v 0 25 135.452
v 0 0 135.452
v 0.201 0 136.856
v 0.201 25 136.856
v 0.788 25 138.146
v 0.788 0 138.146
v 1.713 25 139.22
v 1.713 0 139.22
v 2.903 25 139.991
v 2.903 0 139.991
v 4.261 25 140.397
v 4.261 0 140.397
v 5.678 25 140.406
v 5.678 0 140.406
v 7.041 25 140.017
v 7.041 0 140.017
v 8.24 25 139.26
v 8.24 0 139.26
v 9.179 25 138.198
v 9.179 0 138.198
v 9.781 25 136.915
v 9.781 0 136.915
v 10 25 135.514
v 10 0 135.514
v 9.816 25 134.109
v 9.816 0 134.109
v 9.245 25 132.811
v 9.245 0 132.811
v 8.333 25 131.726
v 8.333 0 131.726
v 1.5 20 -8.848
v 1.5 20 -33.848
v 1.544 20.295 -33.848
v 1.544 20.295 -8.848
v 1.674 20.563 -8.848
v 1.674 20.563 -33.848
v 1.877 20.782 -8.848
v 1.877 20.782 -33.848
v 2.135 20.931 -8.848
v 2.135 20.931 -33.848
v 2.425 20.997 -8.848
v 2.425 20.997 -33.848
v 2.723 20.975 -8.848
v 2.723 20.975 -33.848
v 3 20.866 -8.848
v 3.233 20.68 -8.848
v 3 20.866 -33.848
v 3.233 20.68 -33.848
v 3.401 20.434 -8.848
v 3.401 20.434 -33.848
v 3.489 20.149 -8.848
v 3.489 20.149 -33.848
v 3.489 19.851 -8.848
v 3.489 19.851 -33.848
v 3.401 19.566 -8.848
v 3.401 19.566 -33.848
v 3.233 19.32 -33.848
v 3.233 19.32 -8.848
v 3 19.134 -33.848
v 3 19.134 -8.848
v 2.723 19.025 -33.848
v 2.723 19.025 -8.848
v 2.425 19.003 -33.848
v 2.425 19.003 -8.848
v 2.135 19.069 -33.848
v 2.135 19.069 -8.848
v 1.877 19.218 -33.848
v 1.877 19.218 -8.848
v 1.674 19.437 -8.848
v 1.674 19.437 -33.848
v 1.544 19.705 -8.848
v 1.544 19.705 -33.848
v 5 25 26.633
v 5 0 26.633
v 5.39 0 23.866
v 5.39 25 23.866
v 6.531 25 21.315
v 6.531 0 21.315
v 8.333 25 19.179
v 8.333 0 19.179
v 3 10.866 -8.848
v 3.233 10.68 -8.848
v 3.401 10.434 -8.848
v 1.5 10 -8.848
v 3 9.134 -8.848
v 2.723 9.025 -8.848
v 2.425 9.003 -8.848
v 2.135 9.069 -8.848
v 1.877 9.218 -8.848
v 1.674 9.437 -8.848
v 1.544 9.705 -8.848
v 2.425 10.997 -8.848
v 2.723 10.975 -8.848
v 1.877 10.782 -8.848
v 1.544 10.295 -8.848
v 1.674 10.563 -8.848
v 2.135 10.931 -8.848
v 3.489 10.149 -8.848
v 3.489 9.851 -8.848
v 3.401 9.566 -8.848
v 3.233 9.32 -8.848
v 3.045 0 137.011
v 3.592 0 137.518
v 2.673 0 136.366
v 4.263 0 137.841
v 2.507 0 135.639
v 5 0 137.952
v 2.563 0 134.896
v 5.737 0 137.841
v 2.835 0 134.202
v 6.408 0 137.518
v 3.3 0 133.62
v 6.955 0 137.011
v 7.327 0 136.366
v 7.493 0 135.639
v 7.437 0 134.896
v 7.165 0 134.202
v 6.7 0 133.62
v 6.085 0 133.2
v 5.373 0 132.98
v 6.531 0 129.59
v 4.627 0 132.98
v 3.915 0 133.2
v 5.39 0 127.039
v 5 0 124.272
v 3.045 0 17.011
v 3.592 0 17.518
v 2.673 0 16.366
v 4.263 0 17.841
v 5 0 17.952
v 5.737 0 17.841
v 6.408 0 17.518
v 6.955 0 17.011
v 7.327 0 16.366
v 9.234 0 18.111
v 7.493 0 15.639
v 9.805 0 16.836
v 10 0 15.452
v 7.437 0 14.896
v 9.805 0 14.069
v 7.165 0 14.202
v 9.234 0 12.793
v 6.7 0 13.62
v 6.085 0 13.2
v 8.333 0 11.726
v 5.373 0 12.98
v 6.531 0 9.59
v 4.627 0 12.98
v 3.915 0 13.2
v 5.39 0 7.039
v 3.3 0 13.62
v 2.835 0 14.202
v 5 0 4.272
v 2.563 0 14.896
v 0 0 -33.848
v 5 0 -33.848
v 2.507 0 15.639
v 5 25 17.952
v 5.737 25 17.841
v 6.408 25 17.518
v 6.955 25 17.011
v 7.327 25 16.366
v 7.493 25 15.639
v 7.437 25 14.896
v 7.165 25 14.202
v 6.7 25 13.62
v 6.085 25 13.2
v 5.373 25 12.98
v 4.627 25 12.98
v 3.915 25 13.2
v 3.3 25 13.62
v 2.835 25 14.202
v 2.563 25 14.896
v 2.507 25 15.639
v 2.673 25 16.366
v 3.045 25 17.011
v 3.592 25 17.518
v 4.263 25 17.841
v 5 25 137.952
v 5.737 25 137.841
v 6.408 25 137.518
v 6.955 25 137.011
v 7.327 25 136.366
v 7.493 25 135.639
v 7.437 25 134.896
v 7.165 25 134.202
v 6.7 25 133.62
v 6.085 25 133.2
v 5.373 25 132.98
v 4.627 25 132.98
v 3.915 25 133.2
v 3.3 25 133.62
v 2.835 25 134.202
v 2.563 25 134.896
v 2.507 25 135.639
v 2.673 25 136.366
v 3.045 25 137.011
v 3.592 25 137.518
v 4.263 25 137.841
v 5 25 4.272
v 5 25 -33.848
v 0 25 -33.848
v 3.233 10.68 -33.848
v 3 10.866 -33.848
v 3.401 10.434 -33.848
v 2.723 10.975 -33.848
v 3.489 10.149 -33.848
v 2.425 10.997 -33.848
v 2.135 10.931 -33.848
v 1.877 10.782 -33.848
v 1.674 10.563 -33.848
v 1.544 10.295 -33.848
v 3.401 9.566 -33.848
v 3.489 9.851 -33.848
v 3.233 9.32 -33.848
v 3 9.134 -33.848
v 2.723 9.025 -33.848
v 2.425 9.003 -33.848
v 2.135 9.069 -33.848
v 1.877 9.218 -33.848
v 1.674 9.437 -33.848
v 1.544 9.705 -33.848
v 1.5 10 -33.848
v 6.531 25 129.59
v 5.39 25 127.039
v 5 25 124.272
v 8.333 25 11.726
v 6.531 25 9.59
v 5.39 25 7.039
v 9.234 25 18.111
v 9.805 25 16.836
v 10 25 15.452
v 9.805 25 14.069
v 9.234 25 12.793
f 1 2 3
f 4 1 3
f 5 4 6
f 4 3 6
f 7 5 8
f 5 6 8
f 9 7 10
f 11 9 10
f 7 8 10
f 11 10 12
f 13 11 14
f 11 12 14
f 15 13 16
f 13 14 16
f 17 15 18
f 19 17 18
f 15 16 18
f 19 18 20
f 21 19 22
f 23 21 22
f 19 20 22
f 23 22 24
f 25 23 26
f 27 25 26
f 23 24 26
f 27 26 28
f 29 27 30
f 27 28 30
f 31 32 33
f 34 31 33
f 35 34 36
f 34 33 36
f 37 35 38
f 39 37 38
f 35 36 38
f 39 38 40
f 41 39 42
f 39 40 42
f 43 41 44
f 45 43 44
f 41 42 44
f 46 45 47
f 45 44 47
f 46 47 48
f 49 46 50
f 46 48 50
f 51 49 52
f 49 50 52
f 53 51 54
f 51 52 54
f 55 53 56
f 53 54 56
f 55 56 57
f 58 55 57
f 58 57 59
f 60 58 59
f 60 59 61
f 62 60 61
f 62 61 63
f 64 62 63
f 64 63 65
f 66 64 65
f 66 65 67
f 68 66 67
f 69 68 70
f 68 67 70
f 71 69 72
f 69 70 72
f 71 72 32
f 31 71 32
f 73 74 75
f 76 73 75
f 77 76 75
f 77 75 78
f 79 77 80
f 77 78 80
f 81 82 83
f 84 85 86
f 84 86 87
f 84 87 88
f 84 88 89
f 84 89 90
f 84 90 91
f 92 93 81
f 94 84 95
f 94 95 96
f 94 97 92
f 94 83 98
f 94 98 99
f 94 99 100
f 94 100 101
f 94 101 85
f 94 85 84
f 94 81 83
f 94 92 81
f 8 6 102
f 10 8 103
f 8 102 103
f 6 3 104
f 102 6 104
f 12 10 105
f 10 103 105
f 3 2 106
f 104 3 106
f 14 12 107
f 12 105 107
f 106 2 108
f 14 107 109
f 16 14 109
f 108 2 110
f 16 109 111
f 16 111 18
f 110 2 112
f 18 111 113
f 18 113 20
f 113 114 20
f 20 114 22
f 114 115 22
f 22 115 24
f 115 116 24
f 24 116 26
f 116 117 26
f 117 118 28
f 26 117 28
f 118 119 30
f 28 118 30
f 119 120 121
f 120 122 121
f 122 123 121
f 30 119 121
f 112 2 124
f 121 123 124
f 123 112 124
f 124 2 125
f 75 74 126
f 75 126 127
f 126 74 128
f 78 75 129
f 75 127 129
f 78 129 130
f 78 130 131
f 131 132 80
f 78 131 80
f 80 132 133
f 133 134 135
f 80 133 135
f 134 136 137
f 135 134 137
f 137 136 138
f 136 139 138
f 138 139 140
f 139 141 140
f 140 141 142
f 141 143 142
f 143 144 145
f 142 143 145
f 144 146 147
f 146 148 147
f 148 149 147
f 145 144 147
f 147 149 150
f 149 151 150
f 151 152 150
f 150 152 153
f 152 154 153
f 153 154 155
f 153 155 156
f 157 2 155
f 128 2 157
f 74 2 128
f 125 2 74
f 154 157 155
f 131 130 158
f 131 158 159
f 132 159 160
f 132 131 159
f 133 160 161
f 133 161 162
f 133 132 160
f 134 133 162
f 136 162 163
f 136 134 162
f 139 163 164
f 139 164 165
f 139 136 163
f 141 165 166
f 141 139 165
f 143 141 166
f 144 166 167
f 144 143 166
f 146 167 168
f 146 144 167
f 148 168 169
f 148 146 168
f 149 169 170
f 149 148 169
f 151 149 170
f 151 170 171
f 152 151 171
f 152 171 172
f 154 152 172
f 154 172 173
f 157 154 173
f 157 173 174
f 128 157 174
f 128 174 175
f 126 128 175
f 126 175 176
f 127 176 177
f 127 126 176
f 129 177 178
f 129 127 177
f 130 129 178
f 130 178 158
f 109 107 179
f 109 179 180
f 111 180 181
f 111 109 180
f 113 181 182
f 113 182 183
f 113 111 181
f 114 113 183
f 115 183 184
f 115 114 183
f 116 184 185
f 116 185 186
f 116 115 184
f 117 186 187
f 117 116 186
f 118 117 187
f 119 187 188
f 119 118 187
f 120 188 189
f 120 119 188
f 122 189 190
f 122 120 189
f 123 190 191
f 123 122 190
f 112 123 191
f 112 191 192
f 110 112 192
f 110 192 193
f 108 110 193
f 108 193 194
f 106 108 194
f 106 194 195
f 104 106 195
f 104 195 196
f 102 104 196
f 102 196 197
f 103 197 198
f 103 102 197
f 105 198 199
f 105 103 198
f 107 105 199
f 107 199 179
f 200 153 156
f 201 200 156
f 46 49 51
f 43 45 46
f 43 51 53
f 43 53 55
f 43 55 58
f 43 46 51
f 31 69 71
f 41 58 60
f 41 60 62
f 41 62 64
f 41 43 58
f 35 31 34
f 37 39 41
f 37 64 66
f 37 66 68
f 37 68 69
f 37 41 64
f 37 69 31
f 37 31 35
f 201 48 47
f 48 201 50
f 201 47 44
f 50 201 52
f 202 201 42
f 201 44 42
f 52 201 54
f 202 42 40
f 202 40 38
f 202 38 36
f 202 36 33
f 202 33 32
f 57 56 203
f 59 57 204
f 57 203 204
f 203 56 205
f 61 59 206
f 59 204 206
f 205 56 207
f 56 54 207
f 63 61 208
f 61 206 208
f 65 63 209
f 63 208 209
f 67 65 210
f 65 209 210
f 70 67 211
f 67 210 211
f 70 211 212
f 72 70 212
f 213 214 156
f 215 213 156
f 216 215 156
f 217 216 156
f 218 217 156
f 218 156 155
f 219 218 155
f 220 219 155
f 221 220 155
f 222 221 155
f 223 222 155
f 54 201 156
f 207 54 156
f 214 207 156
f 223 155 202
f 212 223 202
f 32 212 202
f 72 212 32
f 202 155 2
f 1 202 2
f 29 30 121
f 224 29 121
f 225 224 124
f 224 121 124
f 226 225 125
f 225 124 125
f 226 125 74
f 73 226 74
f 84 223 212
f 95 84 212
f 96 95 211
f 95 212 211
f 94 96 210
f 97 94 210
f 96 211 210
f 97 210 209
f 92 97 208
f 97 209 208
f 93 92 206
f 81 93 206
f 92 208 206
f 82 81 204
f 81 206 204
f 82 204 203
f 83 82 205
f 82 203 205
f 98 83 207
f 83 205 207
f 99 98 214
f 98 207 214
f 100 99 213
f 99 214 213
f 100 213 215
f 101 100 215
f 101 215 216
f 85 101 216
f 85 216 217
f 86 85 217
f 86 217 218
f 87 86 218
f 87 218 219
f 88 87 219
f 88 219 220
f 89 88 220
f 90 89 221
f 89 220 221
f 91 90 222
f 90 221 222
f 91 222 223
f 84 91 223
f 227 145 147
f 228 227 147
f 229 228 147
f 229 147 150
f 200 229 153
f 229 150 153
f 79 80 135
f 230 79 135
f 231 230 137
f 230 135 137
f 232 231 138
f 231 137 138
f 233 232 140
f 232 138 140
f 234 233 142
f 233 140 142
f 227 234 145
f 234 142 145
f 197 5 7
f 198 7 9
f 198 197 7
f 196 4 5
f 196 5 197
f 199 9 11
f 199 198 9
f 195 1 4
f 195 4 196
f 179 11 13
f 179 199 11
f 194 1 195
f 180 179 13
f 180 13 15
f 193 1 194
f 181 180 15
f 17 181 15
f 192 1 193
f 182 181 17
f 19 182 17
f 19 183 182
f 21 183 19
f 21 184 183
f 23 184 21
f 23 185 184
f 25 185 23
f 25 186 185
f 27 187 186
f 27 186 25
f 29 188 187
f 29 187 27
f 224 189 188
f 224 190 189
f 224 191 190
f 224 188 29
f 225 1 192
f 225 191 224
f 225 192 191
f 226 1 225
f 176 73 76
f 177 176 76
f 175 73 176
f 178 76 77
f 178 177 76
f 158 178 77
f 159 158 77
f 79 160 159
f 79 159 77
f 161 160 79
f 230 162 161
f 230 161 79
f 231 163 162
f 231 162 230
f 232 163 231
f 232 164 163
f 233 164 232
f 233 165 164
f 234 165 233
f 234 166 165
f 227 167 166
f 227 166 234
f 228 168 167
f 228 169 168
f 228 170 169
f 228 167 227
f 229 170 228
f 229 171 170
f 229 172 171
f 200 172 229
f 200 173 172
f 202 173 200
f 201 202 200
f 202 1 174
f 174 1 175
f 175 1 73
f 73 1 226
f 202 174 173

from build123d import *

# Parameters (mm, degrees)
SKETCH2_R           = 2.5
BOSS_EXTRUDE1_DEPTH = 25
SKETCH3_R           = 1
CUT_EXTRUDE1_DEPTH  = 25


with BuildPart() as part:
    # Sketch2 → Boss-Extrude1 (new body)
    with BuildSketch(Plane(origin=(0, 0, 0), x_dir=(1, 0, 0), z_dir=(0, 1, 0))):
        with BuildLine():
            Line((0, 33.847554993), (0, -135.452445007))
            ThreePointArc((0, -135.452445007), (7.041241452, -140.016799653), (8.333333333, -131.725665044))
            ThreePointArc((8.333333333, -131.725665044), (5.871290708, -128.354588024), (5, -124.272105119))
            Line((5, -124.272105119), (5, -26.632784894))
            ThreePointArc((5, -26.632784894), (5.871290708, -22.55030199), (8.333333333, -19.179224969))
            ThreePointArc((8.333333333, -19.179224969), (10, -15.452445007), (8.333333333, -11.725665044))
            ThreePointArc((8.333333333, -11.725665044), (5.871290708, -8.354588024), (5, -4.272105119))
            Line((5, -4.272105119), (5, 33.847554993))
            Line((5, 33.847554993), (0, 33.847554993))
        make_face()
        with Locations(Location((5, -15.452445007, 0), (0, 0, 270))):
            Circle(SKETCH2_R, mode=Mode.SUBTRACT)
        with Locations(Location((5, -135.452445007, 0), (0, 0, 270))):
            Circle(SKETCH2_R, mode=Mode.SUBTRACT)
    extrude(amount=BOSS_EXTRUDE1_DEPTH)

    # Sketch3 → Cut-Extrude1 (cut)
    with BuildSketch(Plane(origin=(0, 0, -33.847554993), x_dir=(-1, 0, 0), z_dir=(0, 0, -1))):
        with Locations((-2.5, 10)):
            Circle(SKETCH3_R)
        with Locations((-2.5, 20)):
            Circle(SKETCH3_R)
    extrude(amount=-CUT_EXTRUDE1_DEPTH, mode=Mode.SUBTRACT)


solid = part.part
